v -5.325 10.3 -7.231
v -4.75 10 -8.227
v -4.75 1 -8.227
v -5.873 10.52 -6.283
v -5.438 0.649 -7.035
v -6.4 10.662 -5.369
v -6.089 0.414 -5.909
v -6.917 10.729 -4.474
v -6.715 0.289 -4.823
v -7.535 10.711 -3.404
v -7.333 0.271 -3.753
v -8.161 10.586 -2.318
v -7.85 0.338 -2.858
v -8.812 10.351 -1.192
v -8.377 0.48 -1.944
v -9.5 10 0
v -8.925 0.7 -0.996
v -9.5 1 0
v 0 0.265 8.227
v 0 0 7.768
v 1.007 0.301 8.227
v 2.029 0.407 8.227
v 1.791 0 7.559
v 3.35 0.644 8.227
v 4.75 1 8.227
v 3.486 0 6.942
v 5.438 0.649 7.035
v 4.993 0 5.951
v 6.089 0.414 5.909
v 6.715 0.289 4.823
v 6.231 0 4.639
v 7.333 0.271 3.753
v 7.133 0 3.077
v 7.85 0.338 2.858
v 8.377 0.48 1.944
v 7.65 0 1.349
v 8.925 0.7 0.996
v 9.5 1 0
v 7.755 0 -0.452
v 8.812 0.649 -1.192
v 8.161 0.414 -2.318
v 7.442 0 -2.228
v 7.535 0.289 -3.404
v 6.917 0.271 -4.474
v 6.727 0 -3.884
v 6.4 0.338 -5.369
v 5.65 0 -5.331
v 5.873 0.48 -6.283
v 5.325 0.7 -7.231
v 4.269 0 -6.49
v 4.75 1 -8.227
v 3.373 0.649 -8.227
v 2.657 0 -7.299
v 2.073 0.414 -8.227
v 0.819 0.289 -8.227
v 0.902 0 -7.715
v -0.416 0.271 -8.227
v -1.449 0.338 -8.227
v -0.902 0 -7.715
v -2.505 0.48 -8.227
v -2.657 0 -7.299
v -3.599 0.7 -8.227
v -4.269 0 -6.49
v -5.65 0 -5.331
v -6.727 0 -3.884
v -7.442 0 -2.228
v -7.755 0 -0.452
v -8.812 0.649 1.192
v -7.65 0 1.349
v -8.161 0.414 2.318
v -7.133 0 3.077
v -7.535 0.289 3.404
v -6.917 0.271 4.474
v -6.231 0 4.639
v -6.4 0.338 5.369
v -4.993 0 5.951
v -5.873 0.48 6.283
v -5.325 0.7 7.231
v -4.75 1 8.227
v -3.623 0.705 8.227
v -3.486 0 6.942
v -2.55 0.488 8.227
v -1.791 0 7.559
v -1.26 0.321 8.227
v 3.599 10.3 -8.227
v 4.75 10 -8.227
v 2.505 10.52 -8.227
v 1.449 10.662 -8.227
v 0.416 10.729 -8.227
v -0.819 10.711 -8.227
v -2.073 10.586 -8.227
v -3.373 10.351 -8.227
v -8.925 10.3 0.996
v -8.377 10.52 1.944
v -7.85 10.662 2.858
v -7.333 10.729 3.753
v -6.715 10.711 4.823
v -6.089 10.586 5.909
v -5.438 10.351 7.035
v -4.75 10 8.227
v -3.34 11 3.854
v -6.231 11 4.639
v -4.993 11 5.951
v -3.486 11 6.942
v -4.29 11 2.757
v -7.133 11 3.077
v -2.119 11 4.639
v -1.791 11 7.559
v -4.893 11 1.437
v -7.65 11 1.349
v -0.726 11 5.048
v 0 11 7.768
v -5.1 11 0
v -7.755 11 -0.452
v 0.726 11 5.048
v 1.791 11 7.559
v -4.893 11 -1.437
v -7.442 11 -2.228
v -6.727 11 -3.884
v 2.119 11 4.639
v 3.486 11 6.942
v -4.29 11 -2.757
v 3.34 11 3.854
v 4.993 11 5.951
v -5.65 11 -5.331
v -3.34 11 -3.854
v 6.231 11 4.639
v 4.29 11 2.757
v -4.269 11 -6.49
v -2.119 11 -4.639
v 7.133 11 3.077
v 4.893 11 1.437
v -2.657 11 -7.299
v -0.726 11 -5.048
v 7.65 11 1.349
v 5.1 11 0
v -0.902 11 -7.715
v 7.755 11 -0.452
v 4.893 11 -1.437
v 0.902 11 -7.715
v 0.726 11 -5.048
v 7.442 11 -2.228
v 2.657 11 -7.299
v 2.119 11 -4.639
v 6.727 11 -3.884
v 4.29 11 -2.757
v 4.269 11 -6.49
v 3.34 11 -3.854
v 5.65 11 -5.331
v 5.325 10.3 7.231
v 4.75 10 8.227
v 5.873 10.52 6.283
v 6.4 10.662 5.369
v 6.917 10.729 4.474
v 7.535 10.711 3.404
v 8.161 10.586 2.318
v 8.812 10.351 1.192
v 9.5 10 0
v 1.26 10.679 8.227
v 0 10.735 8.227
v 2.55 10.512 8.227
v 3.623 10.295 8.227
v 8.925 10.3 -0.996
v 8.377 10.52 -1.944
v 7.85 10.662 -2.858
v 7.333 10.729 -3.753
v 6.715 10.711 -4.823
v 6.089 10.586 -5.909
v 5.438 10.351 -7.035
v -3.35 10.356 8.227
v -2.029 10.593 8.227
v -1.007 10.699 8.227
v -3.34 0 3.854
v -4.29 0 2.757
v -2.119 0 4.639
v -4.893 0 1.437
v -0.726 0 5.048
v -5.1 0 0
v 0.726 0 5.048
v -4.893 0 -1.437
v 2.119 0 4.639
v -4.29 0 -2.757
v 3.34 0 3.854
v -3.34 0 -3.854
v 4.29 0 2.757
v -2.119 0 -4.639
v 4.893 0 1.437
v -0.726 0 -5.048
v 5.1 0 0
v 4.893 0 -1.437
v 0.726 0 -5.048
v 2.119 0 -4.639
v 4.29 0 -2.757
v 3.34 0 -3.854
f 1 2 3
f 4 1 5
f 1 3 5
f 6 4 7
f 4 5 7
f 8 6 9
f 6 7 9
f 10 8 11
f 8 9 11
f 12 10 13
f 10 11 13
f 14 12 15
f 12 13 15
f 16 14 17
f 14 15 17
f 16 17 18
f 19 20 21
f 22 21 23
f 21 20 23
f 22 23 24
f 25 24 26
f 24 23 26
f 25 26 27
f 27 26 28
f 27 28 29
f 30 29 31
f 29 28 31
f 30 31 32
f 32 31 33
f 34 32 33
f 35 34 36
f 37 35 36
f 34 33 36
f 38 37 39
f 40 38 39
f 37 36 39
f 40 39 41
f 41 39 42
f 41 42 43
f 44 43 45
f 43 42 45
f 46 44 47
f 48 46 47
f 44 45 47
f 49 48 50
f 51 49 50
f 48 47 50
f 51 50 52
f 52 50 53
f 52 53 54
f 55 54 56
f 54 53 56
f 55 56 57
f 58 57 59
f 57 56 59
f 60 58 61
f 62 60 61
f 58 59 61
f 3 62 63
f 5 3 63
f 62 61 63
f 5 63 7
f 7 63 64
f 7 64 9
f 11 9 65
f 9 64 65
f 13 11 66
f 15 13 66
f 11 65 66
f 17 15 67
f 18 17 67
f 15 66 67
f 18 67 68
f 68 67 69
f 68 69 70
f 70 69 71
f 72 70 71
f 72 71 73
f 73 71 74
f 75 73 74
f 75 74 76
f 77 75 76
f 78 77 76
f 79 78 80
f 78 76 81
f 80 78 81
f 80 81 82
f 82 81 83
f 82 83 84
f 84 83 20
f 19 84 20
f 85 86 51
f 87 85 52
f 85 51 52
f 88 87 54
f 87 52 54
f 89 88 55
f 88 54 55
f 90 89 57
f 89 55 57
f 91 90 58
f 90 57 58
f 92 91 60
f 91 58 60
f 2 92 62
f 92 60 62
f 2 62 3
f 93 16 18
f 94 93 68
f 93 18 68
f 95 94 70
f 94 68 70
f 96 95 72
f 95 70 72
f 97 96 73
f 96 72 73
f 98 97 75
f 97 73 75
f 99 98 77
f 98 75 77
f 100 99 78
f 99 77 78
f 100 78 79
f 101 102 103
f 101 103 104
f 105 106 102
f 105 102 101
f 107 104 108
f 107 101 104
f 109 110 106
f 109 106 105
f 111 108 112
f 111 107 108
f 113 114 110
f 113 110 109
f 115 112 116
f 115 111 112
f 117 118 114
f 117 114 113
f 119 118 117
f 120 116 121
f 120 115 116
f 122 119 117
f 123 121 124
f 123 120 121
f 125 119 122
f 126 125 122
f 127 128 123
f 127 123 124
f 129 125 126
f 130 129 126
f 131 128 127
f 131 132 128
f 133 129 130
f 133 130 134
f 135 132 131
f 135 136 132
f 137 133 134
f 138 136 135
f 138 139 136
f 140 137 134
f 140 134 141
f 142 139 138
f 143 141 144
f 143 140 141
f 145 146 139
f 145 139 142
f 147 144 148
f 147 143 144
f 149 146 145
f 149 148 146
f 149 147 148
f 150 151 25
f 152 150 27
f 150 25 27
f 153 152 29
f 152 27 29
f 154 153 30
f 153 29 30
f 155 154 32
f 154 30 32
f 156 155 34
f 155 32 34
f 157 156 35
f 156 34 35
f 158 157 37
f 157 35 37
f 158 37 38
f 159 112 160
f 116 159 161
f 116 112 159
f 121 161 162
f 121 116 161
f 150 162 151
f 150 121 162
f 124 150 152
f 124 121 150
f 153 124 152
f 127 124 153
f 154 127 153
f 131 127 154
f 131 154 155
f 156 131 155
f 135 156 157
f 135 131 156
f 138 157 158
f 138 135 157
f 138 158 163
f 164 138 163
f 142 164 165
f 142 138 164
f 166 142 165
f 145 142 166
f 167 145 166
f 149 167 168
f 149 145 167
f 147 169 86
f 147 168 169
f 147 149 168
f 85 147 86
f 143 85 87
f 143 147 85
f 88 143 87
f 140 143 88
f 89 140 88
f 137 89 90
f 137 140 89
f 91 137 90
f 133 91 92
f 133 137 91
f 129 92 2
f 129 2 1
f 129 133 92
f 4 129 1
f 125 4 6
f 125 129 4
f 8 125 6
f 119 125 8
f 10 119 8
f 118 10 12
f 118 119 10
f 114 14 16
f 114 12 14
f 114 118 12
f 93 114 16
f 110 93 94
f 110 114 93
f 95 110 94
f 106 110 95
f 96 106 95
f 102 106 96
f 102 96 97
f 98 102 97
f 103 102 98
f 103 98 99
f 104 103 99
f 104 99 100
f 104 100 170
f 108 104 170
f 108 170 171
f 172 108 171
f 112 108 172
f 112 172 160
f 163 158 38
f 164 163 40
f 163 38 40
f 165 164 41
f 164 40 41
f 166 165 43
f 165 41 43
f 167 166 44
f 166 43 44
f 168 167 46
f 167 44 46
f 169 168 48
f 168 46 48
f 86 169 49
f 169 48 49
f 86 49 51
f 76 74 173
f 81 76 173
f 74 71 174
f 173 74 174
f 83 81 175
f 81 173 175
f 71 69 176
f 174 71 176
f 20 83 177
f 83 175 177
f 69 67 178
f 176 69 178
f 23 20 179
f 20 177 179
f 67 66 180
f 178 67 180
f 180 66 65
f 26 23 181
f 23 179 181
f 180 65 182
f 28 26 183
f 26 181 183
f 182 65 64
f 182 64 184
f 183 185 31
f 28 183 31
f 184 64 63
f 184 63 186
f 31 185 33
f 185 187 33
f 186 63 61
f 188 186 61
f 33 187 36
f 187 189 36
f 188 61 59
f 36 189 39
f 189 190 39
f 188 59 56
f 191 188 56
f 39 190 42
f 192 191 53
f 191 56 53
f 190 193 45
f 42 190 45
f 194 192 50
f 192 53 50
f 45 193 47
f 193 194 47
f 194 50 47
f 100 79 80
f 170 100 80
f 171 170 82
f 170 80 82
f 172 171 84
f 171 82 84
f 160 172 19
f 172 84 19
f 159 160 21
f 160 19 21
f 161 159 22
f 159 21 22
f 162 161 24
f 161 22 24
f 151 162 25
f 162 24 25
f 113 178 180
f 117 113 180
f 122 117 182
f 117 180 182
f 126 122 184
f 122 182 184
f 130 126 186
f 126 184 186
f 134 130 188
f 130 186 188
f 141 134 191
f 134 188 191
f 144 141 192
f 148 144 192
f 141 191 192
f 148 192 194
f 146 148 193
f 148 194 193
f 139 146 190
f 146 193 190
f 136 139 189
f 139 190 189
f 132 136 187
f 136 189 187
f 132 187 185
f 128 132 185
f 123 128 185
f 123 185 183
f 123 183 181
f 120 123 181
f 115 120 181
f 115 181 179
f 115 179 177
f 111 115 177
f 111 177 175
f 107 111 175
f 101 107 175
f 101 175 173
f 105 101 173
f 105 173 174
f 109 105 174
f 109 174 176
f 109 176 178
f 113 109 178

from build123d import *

# Parameters (mm, degrees)
EXTRUDE_1_DEPTH     = 11
HOLE_WIZARD_M12_1_D = 10.2


with BuildPart() as part:
    # 草图1 → 凸台-拉伸1 (new body)
    with BuildSketch(Plane(origin=(0, 0, 0), x_dir=(1, 0, 0), z_dir=(0, 1, 0))):
        Polygon((9.5, 0), (4.75, 8.227241336), (-4.75, 8.227241336), (-9.5, 0), (-4.75, -8.227241336), (4.75, -8.227241336), align=None)
    extrude(amount=EXTRUDE_1_DEPTH)

    # M12 螺纹孔1 (through all)
    with Locations(Plane(origin=(0, 11, 0), x_dir=(1, 0, 0), z_dir=(0, 1, 0))):
        with Locations((0, 0)):
            Hole(HOLE_WIZARD_M12_1_D / 2)

    # 草图4 → 切除-旋转1 (revolve, cut)
    with BuildSketch(Plane.XY, mode=Mode.PRIVATE) as cut_revolve_1_sk:
        Polygon((-9.5, 10), (-7.767949192, 11), (-9.5, 11), align=None)
    cut_revolve_1 = revolve(cut_revolve_1_sk.sketch.rotate(Axis((0, 0, 0), (0, 1, 0)), 90), axis=Axis((0, 0, 0), (0, 1, 0)), mode=Mode.SUBTRACT)

    # 镜向1: 切除-旋转1 across plane
    add(cut_revolve_1.mirror(Plane.ZX.offset(5.5)), mode=Mode.SUBTRACT)


solid = part.part
